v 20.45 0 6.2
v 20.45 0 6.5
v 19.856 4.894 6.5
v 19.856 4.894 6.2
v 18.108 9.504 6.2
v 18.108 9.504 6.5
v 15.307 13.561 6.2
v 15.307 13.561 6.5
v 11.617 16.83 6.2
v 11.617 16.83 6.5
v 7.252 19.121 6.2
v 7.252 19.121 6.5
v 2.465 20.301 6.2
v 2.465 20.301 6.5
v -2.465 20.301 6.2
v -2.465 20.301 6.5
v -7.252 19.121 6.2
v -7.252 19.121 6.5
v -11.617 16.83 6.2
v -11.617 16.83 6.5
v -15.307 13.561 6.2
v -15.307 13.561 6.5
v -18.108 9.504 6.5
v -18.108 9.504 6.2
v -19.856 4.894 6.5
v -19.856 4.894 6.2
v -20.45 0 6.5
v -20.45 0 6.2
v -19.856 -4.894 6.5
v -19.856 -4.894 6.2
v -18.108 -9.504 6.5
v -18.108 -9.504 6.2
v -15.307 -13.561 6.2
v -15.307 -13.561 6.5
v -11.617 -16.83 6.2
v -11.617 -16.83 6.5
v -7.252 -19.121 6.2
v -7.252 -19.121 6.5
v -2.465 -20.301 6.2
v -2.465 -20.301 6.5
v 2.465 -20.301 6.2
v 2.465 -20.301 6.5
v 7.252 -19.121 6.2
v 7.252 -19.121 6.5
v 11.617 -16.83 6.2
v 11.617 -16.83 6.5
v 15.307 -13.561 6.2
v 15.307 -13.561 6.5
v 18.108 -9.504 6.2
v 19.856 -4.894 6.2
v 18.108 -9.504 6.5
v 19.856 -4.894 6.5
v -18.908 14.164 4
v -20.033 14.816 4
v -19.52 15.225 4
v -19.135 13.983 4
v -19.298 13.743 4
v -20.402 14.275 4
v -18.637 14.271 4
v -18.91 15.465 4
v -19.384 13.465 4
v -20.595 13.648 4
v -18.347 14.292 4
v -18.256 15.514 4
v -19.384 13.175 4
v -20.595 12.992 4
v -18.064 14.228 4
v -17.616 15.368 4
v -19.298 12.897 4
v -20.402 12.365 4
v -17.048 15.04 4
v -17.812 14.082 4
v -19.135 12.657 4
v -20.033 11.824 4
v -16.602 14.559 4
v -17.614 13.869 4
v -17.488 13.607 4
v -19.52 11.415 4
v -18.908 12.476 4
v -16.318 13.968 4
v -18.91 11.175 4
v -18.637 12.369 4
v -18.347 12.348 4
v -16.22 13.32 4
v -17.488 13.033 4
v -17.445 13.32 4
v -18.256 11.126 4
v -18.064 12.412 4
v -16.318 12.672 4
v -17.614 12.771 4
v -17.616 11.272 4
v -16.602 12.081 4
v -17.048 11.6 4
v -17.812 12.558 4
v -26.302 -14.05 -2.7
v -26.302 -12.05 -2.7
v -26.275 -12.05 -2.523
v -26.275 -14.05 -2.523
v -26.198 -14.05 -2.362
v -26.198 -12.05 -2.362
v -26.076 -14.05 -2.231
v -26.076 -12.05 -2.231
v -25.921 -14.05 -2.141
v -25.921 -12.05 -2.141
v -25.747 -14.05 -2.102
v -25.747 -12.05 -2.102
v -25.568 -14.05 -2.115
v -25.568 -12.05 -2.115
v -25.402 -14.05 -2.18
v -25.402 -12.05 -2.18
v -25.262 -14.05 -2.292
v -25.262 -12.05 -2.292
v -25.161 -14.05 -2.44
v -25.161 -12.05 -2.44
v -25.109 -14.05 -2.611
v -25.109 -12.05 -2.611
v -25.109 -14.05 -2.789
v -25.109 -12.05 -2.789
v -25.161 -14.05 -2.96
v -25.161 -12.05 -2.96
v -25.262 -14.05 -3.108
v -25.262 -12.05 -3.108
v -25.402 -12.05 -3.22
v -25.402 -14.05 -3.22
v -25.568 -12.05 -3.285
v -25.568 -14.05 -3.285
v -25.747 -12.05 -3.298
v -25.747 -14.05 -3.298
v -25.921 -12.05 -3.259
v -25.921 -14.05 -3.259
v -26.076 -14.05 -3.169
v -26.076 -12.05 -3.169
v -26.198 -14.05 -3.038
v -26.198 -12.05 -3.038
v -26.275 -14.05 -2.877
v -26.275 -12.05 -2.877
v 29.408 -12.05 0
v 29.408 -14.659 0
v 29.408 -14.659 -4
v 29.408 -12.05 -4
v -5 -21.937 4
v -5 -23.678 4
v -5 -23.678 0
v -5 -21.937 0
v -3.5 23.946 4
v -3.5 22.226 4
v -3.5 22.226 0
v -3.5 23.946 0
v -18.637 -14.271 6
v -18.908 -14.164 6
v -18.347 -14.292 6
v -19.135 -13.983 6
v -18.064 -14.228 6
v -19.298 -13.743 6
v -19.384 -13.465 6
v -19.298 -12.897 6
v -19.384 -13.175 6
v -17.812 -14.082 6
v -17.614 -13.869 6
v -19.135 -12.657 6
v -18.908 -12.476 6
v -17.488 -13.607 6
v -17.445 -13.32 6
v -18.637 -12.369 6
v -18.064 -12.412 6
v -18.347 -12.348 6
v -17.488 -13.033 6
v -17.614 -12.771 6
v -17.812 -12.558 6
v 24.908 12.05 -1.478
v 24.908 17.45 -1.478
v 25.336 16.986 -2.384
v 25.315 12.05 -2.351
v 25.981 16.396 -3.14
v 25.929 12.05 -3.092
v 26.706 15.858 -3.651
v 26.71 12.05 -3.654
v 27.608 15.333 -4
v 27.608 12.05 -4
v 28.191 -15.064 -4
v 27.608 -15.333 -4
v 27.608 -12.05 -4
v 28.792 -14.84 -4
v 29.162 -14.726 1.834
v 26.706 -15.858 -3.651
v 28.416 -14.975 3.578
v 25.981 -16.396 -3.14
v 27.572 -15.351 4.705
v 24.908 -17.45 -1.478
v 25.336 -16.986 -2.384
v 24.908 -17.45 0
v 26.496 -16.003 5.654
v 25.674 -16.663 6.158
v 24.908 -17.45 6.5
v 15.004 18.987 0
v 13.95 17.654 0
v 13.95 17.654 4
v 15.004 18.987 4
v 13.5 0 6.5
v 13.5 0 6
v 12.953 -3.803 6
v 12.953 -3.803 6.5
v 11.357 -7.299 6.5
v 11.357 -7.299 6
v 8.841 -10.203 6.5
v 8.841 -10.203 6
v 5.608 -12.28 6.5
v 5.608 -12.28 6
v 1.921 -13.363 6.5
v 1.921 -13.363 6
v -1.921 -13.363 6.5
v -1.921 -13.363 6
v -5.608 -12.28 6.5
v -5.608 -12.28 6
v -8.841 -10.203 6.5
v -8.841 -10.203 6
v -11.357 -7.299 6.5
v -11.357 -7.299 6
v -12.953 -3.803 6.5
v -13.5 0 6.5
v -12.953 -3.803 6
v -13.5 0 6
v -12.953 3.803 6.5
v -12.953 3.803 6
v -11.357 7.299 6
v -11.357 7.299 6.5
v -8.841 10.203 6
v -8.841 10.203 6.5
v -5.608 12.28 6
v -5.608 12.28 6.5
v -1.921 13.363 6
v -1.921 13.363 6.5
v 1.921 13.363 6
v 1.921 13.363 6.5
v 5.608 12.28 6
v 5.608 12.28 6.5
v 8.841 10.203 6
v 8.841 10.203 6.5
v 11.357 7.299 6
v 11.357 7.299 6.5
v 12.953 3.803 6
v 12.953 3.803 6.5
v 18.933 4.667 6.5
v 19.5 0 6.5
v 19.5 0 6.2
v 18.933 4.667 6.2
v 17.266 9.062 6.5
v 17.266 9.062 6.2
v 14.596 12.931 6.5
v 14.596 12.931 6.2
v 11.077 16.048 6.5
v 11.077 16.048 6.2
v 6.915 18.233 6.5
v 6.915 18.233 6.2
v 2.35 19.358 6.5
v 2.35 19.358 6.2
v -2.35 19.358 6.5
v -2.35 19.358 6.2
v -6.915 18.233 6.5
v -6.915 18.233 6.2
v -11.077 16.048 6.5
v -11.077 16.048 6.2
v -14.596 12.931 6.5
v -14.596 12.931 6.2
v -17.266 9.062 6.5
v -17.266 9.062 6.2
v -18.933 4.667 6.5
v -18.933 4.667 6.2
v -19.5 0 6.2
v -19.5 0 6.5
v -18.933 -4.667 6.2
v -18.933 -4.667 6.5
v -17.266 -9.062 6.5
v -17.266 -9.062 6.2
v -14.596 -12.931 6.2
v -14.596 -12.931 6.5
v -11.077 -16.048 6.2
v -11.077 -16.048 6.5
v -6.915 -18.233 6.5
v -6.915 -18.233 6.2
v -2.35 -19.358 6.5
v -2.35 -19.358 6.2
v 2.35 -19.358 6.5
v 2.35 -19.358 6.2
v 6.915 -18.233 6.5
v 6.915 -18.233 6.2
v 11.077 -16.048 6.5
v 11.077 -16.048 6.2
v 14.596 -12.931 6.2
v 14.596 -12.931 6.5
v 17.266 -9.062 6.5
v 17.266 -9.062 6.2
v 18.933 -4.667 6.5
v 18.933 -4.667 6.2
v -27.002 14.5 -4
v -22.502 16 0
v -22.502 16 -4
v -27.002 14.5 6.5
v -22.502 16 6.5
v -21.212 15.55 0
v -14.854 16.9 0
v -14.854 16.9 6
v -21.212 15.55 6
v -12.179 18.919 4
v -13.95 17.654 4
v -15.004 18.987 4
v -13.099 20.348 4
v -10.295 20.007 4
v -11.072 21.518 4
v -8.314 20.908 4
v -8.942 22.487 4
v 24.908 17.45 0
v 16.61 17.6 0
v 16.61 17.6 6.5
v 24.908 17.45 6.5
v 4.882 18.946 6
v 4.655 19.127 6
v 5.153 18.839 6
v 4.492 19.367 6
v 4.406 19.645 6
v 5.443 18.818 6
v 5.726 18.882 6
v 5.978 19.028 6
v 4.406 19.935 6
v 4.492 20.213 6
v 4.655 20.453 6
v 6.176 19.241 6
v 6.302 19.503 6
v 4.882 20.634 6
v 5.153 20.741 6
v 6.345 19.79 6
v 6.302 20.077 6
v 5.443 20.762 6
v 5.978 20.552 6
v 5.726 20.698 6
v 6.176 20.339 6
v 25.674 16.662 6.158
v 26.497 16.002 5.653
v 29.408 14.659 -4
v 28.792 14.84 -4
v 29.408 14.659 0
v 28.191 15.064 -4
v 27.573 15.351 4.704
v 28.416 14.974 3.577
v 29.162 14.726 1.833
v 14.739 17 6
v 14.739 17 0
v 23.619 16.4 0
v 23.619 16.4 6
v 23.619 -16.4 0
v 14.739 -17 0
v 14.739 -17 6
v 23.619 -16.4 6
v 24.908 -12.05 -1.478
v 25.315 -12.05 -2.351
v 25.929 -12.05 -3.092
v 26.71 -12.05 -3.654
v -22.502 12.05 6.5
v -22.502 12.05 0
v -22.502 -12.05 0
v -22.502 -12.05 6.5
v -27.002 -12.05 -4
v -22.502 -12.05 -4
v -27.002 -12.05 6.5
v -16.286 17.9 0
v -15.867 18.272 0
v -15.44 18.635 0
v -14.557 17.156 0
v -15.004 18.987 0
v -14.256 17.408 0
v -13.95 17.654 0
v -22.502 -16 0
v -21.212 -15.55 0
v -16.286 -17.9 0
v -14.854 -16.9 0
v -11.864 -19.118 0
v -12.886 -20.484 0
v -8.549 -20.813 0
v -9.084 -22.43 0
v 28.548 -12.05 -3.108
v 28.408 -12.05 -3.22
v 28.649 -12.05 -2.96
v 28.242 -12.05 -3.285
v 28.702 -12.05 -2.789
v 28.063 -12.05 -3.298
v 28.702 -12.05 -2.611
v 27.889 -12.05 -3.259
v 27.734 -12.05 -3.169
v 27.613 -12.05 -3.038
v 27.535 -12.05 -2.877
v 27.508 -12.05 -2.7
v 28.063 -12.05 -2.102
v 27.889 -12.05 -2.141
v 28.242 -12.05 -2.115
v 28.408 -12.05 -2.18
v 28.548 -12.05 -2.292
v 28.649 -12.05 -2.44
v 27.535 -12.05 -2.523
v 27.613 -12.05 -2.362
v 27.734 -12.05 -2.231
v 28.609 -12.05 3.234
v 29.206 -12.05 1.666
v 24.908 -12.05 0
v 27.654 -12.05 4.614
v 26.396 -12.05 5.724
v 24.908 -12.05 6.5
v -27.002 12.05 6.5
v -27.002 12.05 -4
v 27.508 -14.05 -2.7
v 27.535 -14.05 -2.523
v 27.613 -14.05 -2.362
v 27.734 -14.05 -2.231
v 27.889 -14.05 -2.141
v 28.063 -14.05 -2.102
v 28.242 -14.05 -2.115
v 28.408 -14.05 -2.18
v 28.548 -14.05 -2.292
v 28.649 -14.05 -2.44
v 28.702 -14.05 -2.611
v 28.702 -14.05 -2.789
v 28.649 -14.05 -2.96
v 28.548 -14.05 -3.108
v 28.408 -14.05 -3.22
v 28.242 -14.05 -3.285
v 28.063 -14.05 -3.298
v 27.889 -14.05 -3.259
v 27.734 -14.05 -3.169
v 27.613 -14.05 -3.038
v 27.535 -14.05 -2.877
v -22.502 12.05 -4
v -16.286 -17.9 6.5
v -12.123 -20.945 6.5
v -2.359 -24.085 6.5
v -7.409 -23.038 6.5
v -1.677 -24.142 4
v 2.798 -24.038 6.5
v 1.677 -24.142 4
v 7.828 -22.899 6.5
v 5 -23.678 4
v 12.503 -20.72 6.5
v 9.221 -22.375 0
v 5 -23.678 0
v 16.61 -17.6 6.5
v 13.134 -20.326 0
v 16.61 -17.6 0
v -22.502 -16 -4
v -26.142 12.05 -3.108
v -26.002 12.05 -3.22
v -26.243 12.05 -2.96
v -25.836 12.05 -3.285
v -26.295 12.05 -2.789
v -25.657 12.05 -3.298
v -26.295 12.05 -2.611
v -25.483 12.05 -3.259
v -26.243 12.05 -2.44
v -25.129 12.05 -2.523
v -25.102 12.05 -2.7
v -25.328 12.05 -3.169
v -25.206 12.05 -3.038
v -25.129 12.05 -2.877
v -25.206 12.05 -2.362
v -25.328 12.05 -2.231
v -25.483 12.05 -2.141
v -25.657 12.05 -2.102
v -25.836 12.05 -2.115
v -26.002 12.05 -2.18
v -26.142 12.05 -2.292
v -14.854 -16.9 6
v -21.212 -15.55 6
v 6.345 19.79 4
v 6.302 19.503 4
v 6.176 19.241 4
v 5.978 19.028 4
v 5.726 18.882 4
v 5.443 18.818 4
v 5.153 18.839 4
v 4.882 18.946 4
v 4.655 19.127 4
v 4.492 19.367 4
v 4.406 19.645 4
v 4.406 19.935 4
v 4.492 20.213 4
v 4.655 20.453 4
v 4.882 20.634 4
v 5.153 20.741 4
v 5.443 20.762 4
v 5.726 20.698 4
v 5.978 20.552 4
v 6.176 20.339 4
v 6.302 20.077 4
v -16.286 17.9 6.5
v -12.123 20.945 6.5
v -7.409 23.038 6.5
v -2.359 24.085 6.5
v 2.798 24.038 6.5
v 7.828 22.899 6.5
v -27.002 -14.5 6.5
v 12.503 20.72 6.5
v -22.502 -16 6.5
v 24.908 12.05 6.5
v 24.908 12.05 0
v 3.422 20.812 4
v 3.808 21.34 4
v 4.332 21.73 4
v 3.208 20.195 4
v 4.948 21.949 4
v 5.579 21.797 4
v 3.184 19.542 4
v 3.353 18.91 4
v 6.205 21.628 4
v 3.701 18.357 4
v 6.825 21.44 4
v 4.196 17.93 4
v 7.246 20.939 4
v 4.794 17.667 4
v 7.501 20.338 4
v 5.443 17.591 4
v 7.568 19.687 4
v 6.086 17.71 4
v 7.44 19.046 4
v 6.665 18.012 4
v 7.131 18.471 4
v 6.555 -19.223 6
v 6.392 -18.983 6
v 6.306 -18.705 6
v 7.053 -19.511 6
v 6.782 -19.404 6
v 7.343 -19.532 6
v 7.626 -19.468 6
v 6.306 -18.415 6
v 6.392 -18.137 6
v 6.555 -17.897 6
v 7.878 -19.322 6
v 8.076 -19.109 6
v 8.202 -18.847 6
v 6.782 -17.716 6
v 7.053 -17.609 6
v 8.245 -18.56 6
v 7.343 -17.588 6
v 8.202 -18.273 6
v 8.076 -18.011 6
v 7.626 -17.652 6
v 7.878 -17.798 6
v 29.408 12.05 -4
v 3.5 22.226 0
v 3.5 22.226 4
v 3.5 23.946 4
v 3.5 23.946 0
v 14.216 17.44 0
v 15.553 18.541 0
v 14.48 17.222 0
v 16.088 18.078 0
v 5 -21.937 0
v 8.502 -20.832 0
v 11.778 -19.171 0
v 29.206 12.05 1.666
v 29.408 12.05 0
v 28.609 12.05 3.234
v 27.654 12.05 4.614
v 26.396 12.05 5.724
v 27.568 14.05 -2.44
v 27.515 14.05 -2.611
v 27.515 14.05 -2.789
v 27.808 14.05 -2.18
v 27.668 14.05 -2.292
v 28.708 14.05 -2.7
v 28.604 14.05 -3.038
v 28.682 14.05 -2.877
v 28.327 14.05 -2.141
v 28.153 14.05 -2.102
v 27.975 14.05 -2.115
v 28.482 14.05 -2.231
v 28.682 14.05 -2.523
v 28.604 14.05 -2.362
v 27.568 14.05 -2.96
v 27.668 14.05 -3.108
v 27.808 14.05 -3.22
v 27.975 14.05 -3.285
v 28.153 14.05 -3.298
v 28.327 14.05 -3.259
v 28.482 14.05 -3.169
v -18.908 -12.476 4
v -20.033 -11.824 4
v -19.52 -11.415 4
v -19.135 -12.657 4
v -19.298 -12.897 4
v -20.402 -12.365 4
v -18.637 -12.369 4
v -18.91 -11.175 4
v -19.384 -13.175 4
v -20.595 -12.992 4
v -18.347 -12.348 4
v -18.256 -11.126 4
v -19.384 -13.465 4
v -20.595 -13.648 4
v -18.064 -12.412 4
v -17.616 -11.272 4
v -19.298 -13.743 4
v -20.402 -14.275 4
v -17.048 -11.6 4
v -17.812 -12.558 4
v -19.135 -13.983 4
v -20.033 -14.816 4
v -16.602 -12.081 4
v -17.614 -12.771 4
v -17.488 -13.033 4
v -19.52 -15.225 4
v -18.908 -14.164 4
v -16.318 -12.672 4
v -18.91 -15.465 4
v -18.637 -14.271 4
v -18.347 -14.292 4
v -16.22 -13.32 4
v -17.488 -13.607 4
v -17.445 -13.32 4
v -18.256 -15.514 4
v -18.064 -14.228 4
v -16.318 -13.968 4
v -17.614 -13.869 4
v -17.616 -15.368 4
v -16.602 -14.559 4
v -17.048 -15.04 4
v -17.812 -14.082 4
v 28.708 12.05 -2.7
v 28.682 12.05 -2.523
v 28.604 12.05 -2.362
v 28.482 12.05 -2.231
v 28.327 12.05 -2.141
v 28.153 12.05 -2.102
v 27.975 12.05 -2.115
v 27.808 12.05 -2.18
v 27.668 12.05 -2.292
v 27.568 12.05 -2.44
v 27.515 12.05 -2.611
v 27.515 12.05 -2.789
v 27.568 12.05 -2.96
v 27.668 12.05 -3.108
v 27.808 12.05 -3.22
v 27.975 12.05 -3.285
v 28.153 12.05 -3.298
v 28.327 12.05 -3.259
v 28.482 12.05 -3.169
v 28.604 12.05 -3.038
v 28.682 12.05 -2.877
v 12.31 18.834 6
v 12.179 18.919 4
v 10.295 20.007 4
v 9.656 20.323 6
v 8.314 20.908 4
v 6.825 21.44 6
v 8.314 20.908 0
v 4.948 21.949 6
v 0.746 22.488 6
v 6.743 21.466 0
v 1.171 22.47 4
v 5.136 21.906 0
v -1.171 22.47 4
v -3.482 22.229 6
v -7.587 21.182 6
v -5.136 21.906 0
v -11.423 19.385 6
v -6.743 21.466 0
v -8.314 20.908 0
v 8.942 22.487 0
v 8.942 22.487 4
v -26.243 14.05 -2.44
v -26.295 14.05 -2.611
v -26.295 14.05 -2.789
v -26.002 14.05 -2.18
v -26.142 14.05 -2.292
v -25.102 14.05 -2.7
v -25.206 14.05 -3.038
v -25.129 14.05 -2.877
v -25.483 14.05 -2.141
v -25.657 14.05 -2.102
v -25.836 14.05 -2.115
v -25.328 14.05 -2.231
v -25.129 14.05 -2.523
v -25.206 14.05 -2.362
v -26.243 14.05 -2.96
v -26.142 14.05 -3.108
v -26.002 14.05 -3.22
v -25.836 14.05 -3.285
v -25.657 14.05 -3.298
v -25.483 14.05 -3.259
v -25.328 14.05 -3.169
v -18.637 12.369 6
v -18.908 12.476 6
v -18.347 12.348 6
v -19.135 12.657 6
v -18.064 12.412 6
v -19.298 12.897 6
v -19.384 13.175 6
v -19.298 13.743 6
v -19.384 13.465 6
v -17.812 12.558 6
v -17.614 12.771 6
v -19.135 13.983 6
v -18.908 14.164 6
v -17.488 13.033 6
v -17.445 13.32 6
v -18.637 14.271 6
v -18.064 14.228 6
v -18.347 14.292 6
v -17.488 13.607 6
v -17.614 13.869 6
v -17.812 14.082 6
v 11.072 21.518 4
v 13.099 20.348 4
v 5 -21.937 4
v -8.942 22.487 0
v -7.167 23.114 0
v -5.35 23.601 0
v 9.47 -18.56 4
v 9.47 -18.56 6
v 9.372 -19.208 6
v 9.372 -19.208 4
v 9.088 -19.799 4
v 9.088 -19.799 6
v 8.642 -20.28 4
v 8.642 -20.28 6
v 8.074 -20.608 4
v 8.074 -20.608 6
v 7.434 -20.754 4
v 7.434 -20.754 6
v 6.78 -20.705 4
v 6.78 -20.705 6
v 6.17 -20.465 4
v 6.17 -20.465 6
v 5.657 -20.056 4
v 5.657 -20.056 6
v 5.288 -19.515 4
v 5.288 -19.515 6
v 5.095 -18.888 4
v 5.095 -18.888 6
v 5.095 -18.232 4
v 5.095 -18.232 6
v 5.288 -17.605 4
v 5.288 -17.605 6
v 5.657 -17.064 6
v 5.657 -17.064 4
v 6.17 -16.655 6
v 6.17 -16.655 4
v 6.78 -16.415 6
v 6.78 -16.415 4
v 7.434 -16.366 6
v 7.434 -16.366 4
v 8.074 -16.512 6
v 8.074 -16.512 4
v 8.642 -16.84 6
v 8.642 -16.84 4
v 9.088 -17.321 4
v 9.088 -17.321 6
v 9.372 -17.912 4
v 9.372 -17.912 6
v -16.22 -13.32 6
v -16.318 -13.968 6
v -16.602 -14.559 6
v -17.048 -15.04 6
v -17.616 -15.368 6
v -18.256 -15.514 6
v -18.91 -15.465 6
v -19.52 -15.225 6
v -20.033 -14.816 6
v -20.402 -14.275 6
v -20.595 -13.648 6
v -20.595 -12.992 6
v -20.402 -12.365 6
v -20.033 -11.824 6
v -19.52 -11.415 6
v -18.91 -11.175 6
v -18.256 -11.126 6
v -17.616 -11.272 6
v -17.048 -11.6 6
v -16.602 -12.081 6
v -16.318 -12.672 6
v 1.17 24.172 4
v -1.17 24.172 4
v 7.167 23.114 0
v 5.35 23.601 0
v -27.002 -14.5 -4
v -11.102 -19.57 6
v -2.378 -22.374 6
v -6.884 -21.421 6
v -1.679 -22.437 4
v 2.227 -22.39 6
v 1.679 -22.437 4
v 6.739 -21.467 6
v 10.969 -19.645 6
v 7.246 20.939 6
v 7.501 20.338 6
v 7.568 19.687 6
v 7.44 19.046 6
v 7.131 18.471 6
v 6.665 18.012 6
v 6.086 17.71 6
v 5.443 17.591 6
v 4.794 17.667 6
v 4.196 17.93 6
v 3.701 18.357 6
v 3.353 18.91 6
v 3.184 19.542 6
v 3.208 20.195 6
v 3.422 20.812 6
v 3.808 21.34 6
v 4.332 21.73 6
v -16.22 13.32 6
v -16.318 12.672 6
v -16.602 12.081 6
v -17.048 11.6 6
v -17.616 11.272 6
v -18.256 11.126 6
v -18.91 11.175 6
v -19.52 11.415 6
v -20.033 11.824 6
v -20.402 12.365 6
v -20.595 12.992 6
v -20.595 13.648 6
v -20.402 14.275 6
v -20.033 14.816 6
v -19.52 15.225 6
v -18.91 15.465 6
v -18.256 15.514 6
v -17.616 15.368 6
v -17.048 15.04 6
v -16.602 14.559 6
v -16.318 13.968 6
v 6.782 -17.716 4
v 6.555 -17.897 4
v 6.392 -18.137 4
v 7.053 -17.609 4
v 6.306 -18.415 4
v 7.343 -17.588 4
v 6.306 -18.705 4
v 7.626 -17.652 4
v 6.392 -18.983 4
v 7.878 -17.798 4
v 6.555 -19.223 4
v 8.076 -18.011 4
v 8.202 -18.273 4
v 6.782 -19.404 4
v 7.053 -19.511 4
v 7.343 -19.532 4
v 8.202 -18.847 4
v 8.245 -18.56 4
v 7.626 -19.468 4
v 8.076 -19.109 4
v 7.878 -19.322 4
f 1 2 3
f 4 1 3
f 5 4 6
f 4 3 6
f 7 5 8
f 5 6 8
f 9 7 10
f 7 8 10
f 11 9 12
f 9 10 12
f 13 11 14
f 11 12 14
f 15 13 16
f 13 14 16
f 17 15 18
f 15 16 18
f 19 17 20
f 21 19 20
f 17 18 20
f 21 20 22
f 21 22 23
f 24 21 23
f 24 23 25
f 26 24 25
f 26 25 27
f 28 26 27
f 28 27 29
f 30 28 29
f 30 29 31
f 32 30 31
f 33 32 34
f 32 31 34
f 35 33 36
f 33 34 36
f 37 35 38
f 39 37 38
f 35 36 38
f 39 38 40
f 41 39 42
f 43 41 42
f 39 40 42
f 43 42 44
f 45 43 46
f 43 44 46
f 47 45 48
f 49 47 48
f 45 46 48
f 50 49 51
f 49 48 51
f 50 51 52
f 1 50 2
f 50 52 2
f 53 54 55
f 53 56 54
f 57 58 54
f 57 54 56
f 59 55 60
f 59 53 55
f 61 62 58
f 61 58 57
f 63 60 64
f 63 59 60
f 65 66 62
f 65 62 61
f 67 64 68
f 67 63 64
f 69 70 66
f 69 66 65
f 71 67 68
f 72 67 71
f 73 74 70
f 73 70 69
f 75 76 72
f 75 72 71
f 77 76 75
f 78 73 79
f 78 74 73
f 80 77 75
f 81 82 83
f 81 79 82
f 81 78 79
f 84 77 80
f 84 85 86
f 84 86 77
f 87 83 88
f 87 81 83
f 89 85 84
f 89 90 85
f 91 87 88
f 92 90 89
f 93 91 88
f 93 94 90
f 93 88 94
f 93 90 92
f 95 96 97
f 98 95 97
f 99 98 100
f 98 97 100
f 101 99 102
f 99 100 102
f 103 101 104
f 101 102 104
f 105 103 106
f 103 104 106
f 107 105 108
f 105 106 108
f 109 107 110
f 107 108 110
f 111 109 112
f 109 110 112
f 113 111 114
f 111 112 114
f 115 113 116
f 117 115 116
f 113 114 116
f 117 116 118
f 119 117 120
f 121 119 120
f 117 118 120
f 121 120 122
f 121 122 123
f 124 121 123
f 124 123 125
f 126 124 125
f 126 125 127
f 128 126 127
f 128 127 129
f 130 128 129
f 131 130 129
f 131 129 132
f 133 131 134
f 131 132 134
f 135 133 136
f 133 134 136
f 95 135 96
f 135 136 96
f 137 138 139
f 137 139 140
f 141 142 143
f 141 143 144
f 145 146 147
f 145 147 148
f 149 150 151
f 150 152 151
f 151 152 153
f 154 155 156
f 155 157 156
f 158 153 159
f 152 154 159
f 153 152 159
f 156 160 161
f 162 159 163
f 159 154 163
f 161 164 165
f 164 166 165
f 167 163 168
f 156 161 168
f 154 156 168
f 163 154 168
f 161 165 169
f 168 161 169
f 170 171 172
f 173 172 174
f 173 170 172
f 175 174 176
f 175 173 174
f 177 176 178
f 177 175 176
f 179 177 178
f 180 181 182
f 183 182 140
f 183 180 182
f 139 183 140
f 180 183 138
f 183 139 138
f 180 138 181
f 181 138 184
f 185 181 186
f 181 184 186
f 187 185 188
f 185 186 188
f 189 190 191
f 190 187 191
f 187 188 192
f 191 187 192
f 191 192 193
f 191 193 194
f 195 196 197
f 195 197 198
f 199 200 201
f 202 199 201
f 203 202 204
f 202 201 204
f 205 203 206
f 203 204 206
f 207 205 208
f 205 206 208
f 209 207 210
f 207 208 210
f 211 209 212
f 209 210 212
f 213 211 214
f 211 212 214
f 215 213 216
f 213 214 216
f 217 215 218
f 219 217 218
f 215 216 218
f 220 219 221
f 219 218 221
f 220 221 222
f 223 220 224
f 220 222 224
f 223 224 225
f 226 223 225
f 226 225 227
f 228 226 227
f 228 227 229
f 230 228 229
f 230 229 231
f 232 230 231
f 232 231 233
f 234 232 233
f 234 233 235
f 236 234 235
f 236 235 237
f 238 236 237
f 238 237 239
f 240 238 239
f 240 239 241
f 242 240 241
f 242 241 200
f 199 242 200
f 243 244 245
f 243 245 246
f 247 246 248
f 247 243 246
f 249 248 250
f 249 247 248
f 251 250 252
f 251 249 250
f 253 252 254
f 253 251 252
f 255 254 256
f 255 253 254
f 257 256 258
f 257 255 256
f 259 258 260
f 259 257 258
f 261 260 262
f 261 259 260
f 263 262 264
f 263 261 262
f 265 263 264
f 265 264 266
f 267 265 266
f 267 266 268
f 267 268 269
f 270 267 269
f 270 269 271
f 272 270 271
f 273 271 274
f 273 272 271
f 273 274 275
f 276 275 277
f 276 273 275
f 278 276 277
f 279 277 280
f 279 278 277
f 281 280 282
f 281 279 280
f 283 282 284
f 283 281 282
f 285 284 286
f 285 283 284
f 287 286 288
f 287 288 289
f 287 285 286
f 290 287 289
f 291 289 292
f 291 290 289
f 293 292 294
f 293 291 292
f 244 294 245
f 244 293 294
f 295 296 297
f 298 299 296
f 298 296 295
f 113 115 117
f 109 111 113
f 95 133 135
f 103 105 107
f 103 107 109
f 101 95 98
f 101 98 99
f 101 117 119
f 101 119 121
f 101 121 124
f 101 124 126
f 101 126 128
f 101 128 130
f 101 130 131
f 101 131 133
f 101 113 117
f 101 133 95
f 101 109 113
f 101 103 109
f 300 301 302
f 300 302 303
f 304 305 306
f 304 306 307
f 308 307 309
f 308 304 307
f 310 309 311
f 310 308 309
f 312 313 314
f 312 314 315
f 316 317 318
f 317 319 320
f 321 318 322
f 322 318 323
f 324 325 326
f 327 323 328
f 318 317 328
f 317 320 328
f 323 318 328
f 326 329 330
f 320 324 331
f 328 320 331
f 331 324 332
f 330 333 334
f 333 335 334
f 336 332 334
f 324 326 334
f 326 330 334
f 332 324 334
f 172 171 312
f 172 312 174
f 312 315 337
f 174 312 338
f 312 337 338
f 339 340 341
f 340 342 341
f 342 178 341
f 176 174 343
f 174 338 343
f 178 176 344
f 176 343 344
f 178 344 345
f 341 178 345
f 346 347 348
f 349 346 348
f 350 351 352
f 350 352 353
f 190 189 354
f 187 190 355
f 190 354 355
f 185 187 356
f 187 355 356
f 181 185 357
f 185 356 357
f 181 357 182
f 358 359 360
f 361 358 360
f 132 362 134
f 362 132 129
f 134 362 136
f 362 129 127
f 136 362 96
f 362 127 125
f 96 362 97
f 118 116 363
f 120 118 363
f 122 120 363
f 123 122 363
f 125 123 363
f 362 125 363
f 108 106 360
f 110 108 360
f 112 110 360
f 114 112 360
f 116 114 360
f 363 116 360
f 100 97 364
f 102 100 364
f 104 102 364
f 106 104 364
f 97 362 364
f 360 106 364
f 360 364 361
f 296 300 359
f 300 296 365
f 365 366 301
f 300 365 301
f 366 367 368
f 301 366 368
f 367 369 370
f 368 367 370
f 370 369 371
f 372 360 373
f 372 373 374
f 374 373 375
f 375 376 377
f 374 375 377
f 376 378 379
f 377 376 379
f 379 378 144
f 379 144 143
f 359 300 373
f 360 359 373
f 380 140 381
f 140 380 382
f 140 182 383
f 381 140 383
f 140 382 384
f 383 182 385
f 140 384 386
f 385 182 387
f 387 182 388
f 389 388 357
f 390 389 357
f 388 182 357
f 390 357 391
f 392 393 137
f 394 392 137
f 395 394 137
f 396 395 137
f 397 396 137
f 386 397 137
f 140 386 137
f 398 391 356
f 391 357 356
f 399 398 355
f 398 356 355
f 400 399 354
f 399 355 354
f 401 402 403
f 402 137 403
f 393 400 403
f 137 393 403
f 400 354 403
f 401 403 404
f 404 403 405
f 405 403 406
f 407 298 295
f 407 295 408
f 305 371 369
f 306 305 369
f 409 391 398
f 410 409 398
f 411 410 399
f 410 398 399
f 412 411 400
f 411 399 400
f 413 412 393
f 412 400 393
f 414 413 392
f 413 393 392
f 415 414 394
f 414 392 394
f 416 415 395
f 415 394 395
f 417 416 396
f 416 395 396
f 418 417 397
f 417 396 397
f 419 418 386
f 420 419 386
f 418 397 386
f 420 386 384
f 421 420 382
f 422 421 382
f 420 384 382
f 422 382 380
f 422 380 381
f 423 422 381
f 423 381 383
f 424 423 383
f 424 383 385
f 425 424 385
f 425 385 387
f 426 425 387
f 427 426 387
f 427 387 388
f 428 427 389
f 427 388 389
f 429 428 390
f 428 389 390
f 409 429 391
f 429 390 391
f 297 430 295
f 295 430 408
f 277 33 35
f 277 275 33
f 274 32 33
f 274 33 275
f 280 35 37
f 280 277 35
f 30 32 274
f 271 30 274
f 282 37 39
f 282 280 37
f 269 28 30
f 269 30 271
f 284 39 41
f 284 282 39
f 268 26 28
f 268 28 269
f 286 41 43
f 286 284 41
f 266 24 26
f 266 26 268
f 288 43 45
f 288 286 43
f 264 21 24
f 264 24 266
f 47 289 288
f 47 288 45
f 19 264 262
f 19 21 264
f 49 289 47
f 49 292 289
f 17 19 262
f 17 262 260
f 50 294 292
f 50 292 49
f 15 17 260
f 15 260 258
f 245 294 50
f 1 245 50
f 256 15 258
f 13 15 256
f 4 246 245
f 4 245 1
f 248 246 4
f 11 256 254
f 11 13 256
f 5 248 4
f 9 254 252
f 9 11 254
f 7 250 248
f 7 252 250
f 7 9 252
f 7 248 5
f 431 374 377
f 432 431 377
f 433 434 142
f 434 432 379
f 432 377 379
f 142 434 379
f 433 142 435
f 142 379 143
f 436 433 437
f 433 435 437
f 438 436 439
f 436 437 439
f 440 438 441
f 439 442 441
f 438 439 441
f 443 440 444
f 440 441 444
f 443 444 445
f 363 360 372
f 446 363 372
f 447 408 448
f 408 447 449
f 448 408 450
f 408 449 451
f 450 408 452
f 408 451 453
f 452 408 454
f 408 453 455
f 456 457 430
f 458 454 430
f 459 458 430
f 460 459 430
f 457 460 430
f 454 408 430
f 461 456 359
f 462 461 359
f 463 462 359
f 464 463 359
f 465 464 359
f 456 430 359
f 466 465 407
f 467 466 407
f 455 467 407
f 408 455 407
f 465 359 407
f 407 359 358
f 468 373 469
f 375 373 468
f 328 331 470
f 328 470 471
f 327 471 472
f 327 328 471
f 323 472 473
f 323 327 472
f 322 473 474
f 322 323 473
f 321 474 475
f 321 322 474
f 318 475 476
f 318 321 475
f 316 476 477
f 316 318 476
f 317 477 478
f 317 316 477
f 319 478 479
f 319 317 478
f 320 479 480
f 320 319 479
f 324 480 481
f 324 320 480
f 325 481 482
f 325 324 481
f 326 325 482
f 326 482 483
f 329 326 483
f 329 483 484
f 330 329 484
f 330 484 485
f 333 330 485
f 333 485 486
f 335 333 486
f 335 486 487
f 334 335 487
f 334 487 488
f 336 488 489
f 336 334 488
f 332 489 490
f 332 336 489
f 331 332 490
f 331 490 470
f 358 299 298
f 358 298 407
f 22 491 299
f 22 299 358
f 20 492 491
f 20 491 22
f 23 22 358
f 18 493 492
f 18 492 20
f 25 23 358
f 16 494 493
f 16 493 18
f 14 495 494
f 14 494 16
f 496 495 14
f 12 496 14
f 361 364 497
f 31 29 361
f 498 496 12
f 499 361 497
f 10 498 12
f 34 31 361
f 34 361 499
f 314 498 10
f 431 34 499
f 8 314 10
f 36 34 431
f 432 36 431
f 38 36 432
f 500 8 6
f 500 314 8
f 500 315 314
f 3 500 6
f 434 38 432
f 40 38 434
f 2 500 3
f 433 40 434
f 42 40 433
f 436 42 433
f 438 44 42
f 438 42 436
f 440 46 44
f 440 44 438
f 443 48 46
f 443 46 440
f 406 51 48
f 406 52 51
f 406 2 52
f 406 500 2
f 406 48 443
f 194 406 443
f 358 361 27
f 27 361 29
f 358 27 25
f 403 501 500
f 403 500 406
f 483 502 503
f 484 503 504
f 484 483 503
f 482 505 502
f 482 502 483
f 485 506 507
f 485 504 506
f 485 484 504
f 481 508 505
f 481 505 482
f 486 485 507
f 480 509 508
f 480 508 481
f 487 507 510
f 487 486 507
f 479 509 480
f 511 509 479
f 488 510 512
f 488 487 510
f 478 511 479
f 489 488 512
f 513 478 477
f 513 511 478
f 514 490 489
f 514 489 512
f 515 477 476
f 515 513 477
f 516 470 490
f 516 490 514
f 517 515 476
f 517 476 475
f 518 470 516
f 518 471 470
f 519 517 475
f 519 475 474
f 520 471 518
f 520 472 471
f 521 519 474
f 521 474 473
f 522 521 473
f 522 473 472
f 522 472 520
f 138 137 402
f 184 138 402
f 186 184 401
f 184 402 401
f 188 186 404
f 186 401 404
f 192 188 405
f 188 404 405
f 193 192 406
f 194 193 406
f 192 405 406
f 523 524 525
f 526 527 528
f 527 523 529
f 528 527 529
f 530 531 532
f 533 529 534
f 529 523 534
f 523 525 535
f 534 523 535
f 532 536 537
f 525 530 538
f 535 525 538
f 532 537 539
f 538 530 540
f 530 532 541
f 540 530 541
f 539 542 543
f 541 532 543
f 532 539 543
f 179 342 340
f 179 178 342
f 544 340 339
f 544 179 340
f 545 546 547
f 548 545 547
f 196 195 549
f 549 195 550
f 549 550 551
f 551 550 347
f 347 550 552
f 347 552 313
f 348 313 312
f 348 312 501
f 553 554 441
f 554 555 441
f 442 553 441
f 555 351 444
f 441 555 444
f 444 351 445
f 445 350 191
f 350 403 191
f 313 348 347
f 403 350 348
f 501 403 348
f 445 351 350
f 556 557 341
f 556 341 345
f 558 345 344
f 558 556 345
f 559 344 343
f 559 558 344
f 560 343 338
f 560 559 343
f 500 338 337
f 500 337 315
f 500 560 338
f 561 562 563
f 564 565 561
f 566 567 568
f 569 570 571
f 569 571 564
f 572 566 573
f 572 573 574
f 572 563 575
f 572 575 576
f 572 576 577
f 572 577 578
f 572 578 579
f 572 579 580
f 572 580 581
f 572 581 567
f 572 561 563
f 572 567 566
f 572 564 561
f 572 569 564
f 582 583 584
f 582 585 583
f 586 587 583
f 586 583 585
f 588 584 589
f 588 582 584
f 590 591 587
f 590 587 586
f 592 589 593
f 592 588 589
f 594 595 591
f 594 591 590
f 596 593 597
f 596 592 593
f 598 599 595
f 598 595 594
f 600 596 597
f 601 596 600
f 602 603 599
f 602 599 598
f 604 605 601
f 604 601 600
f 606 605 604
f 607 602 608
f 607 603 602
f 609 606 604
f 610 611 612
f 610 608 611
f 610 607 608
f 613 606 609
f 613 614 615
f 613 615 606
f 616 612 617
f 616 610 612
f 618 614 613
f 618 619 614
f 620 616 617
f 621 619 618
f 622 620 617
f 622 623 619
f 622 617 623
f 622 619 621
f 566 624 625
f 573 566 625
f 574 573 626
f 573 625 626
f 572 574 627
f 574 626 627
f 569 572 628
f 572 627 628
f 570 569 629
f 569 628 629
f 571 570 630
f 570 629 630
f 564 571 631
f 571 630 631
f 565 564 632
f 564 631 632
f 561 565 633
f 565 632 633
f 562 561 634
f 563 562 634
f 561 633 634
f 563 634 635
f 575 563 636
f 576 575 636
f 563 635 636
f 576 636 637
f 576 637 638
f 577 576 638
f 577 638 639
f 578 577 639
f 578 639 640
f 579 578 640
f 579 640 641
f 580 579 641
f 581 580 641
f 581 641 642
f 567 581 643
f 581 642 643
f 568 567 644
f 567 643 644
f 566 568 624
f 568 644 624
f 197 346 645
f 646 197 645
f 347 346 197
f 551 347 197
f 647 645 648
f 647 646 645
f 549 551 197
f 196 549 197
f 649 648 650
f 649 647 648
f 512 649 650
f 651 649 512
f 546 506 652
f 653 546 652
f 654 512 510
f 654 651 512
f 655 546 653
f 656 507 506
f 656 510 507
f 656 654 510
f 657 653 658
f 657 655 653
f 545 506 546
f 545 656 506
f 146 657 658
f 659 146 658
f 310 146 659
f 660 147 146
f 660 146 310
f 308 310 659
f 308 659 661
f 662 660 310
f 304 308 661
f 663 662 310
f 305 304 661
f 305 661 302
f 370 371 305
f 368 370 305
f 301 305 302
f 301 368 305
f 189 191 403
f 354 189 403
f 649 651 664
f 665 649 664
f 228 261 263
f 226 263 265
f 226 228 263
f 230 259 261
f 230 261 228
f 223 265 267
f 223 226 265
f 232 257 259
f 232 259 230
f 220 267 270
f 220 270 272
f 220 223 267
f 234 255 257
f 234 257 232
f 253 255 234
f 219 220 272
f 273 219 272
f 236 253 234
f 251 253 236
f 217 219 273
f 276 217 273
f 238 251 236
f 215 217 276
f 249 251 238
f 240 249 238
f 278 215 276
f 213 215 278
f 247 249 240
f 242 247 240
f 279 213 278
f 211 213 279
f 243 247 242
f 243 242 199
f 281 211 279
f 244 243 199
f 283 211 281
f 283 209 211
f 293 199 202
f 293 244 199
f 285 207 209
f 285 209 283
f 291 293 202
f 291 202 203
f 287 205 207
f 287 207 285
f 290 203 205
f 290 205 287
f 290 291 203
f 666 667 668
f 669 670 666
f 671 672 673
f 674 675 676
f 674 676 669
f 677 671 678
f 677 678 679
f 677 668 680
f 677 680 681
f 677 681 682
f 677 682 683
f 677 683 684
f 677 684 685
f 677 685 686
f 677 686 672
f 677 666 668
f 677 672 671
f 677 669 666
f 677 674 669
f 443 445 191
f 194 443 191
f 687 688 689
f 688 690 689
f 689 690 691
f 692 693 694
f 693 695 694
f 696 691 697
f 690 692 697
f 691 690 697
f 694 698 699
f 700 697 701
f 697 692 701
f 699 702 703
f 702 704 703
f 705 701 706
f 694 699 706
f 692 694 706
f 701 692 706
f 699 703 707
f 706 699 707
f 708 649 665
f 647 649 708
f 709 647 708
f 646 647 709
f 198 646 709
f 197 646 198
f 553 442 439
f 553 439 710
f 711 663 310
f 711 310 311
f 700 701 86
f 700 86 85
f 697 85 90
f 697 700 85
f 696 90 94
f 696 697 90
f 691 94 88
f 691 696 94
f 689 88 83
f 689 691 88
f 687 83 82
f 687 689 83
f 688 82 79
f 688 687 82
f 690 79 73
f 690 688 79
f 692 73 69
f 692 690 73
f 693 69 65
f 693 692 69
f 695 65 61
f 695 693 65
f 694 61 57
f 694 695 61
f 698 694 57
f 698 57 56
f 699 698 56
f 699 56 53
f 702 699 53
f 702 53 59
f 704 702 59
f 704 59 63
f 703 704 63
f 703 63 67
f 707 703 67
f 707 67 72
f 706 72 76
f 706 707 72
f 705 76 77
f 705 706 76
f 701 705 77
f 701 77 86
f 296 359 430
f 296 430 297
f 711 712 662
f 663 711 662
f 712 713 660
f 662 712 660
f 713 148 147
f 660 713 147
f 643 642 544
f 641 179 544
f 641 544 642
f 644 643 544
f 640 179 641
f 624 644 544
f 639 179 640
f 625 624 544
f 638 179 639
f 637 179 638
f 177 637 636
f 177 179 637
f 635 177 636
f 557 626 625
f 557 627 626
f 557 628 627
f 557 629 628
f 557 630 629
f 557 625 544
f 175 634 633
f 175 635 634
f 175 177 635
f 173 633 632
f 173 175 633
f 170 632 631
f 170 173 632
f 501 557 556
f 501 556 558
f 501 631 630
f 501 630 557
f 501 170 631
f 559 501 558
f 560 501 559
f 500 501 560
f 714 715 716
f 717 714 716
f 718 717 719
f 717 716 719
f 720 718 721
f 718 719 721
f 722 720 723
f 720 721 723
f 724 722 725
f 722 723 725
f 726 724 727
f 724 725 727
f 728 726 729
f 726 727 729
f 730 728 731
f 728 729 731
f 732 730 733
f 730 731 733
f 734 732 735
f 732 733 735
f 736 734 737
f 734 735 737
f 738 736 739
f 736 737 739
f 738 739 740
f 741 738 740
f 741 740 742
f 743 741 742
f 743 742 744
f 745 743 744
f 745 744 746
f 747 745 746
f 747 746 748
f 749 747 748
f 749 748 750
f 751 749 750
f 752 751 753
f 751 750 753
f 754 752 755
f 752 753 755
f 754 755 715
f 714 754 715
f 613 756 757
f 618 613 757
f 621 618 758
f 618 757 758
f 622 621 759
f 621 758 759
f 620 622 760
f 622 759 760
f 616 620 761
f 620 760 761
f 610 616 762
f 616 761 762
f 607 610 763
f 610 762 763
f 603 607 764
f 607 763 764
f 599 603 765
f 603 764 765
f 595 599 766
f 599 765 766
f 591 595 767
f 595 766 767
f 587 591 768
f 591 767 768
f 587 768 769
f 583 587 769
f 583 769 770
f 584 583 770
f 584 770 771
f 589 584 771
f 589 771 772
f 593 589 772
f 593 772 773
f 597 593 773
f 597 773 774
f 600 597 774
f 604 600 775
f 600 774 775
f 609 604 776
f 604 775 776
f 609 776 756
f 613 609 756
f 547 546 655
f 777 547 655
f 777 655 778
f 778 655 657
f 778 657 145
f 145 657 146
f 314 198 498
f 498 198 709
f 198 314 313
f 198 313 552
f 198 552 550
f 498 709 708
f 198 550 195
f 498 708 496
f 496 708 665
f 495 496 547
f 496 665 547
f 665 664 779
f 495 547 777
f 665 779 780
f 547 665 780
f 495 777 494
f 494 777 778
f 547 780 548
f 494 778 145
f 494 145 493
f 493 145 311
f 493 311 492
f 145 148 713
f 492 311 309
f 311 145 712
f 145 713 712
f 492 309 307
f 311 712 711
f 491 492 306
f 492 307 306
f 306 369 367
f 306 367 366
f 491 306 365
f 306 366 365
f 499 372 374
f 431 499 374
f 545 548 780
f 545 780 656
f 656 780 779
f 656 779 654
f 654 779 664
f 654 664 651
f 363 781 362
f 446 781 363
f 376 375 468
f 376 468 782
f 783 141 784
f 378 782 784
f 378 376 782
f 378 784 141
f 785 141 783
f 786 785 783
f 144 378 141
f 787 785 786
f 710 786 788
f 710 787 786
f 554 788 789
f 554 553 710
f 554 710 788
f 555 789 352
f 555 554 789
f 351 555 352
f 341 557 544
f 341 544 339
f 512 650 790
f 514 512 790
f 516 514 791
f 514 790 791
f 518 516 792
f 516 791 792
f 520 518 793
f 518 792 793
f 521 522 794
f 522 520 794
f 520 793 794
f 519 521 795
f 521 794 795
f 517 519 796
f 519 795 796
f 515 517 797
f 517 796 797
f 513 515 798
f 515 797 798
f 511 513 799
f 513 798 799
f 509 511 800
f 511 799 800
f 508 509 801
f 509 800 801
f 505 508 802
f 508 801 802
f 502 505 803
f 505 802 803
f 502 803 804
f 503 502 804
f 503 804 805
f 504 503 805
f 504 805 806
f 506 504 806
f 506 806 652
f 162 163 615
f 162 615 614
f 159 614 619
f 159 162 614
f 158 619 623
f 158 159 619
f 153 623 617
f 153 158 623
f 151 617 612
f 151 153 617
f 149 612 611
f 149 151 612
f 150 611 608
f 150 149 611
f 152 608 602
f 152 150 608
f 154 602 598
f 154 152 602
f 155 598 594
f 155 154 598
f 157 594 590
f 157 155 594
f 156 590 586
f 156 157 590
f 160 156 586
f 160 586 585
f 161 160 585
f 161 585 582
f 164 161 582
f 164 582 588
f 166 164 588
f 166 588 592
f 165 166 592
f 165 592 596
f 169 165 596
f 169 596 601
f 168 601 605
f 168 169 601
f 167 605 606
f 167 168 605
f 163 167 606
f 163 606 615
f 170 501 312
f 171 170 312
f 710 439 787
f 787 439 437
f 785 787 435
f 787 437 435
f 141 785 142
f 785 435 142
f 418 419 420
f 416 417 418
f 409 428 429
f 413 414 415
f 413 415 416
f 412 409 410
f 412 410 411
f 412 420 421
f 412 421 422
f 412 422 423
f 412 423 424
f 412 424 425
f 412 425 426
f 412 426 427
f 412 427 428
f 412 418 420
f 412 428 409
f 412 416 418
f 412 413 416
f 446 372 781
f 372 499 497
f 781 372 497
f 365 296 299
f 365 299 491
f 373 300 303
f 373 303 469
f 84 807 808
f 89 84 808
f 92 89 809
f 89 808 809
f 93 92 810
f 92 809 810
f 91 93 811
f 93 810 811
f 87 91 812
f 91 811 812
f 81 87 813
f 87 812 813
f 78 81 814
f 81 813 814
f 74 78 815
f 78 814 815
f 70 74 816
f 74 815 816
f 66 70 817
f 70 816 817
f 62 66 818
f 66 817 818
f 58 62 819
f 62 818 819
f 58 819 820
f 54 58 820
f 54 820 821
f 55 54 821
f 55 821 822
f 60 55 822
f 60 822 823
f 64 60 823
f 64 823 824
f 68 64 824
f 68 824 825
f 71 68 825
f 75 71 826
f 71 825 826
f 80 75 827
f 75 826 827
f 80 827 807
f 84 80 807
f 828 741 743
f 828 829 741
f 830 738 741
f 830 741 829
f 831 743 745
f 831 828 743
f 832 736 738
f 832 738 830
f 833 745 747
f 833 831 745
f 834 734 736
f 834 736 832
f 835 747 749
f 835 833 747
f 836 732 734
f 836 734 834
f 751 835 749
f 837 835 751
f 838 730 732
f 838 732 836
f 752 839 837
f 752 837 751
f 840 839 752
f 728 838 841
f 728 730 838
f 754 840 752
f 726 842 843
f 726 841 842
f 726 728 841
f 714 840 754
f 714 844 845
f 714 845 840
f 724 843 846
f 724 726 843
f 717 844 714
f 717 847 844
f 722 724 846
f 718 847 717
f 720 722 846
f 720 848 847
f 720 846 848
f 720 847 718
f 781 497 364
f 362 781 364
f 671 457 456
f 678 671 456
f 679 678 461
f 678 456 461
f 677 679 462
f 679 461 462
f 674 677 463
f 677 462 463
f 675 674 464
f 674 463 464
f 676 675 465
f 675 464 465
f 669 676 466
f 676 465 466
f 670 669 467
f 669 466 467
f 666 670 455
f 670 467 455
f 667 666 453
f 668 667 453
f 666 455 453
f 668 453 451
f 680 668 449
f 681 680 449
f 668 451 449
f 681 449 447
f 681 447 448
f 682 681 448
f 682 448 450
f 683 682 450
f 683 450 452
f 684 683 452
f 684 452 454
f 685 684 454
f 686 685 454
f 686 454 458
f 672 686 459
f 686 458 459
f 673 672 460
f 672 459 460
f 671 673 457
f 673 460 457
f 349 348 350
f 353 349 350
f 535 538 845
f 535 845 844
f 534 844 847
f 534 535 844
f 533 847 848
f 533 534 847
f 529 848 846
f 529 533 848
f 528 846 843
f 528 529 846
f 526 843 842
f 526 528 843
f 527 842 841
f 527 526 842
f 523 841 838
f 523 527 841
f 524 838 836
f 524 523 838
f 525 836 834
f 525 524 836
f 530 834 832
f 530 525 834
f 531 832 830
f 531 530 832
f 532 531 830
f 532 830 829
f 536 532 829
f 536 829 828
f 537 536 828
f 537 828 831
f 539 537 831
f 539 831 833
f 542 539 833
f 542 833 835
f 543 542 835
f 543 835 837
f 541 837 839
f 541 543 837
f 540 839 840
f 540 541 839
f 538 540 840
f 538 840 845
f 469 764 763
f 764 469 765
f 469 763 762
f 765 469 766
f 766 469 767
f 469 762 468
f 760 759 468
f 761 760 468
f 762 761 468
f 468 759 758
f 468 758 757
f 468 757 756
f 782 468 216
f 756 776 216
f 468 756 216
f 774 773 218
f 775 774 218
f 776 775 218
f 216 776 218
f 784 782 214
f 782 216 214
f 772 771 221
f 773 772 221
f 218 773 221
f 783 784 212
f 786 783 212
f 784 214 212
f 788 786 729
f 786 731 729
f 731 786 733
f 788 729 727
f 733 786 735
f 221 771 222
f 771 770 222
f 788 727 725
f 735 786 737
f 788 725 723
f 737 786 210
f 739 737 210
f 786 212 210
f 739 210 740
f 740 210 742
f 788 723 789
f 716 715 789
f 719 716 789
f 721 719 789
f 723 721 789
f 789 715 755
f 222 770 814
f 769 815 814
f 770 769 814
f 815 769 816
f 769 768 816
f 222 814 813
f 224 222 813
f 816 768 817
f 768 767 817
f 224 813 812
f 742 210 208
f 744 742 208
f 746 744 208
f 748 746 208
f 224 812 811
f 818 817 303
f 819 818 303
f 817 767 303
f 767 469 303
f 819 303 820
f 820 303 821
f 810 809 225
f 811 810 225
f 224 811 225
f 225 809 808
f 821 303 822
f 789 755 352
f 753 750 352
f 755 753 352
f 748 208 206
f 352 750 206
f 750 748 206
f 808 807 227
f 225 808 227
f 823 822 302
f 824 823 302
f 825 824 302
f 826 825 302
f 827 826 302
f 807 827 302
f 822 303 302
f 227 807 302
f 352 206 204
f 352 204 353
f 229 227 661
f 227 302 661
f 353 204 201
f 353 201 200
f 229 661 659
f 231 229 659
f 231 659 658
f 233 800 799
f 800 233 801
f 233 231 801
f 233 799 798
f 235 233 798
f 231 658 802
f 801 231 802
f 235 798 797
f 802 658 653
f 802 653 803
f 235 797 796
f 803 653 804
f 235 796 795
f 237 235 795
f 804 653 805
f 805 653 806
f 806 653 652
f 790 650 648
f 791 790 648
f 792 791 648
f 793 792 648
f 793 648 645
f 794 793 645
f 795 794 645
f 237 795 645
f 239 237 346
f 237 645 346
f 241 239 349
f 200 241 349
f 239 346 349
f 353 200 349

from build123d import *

# Parameters (mm, degrees)
PAD_DEPTH            = 6.5
POCKET_DEPTH         = 6
SKETCH002_R          = 13.5
POCKET001_DEPTH      = 1
SKETCH003_W          = 5.4
SKETCH003_H          = 6.5
PAD001_DEPTH         = 4.5
POCKET002_DEPTH      = 10
SKETCH010_W          = 3.95
SKETCH010_H          = 6.5
PAD002_DEPTH         = 4.5
POCKET005_DEPTH      = 10
SKETCH014_R          = 20.45
SKETCH014_R_2        = 19.5
POCKET008_DEPTH      = 0.3
SKETCH015_R          = 2.2
SKETCH015_R_2        = 0.975
PAD003_DEPTH         = 2
POCKET009_DEPTH      = 4
POCKET010_DEPTH      = 4
PAD004_DEPTH         = 4
SKETCH019_R          = 0.6
POCKET011_DEPTH      = 2
SKETCH020_R          = 0.6
POCKET012_DEPTH      = 2
POCKET013_DEPTH      = 12.151
POCKET013_DEPTH_BACK = 36.251


with BuildPart() as part:
    # Sketch → Pad (new body)
    with BuildSketch(Plane.XY):
        with BuildLine():
            Line((-22.5019915649, 16), (-22.5019915649, -16))
            Line((-22.5019915649, -16), (-16.2858834577, -17.9000000001))
            ThreePointArc((-16.2858834577, -17.9000000001), (0.2206895737, -24.1989937004), (16.6096357576, -17.5999999999))
            Line((16.6096357576, -17.5999999999), (24.9082802252, -17.45))
            Line((24.9082802252, 17.45), (24.9082802252, -17.45))
            Line((16.6096357576, 17.6), (24.9082802252, 17.45))
            ThreePointArc((16.6096357576, 17.6), (0.2206895736, 24.1989937004), (-16.2858834578, 17.9))
            Line((-22.5019915649, 16), (-16.2858834578, 17.9))
        make_face()
    extrude(amount=PAD_DEPTH)

    # Sketch001 → Pocket (cut)
    with BuildSketch(Plane.XY):
        with BuildLine():
            Line((-14.8539557021, 16.9), (-21.2122180433, 15.55))
            Line((-21.2122180433, 15.55), (-21.2122180433, -15.55))
            Line((-21.2122180433, -15.55), (-14.8539557021, -16.9))
            ThreePointArc((-14.8539557021, -16.9), (-0.0760301383, -22.4998715423), (14.739402973, -17))
            Line((14.739402973, -17), (23.6191552218, -16.4))
            Line((23.6191552218, 16.4), (23.6191552218, -16.4))
            Line((14.739402973, 17), (23.6191552218, 16.4))
            ThreePointArc((14.739402973, 17), (-0.0760301383, 22.4998715423), (-14.8539557021, 16.9))
        make_face()
    extrude(amount=POCKET_DEPTH, mode=Mode.SUBTRACT)

    # Sketch002 (on Face19 of Pocket) → Pocket001 (cut)
    with BuildSketch(Plane(origin=(0, 0, 6), x_dir=(1, 0, 0), z_dir=(0, 0, -1))):
        Circle(SKETCH002_R)
    extrude(amount=-POCKET001_DEPTH, mode=Mode.SUBTRACT)

    # Sketch003 (on Face7 of Pad) → Pad001 (join)
    with BuildSketch(Plane.YZ.offset(24.9082802252)):
        with Locations((-14.75, 3.25)):
            Rectangle(SKETCH003_W, SKETCH003_H)
        with Locations((14.75, 3.25)):
            Rectangle(SKETCH003_W, SKETCH003_H)
    extrude(amount=PAD001_DEPTH)

    # Sketch006 (on Face22 of Pad001) → Pocket002 (cut)
    with BuildSketch(Plane.XY.offset(6.5)):
        with BuildLine():
            ThreePointArc((24.9082802252, 17.45), (26.9423471239, 15.7065020586), (29.4082802252, 14.6594169811))
            Line((29.4082802252, 17.45), (29.4082802252, 14.6594169811))
            Line((29.4082802252, 17.45), (24.9082802252, 17.45))
        make_face()
        with BuildLine():
            ThreePointArc((29.4082802252, -14.6594169811), (26.9423471239, -15.7065020586), (24.9082802252, -17.45))
            Line((29.4082802252, -17.45), (24.9082802252, -17.45))
            Line((29.4082802252, -14.6594169811), (29.4082802252, -17.45))
        make_face()
    extrude(amount=-POCKET002_DEPTH, mode=Mode.SUBTRACT)

    # Sketch010 (on Face3 of Pad) → Pad002 (join)
    with BuildSketch(Plane(origin=(-22.5019915649, 0, 0), x_dir=(0, -1, 0), z_dir=(-1, 0, 0))):
        with Locations((-14.025, 3.25)):
            Rectangle(SKETCH010_W, SKETCH010_H)
        with Locations((14.025, 3.25)):
            Rectangle(SKETCH010_W, SKETCH010_H)
    extrude(amount=PAD002_DEPTH)

    # Sketch011 (on Face28 of Pad002) → Pocket005 (cut)
    with BuildSketch(Plane.XY.offset(6.5)):
        Polygon((-27.0019915649, 16), (-22.5019915649, 16), (-27.0019915649, 14.5), align=None)
        Polygon((-22.5019915649, -16), (-27.0019915649, -14.5), (-27.0019915649, -16), align=None)
    extrude(amount=-POCKET005_DEPTH, mode=Mode.SUBTRACT)

    # Sketch014 (on Face10 of Pad) → Pocket008 (cut)
    with BuildSketch(Plane.XY.offset(6.5)):
        Circle(SKETCH014_R)
        Circle(SKETCH014_R_2, mode=Mode.SUBTRACT)
    extrude(amount=-POCKET008_DEPTH, mode=Mode.SUBTRACT)

    # Sketch015 (on Face19 of Pocket) → Pad003 (join)
    with BuildSketch(Plane(origin=(0, 0, 6), x_dir=(1, 0, 0), z_dir=(0, 0, -1))):
        with Locations((-18.42, 13.32)):
            Circle(SKETCH015_R)
        with Locations((-18.42, 13.32)):
            Circle(SKETCH015_R_2, mode=Mode.SUBTRACT)
        with Locations((7.27, 18.56)):
            Circle(SKETCH015_R)
        with Locations((7.27, 18.56)):
            Circle(SKETCH015_R_2, mode=Mode.SUBTRACT)
        with Locations((5.37, -19.79)):
            Circle(SKETCH015_R)
        with Locations((5.37, -19.79)):
            Circle(SKETCH015_R_2, mode=Mode.SUBTRACT)
        with Locations((-18.42, -13.32)):
            Circle(SKETCH015_R)
        with Locations((-18.42, -13.32)):
            Circle(SKETCH015_R_2, mode=Mode.SUBTRACT)
    extrude(amount=PAD003_DEPTH)

    # Sketch016 → Pocket009 (cut)
    with BuildSketch(Plane(origin=(0, 0, 0), x_dir=(-1, 0, 0), z_dir=(0, 0, 1))):
        with BuildLine():
            Line((-5, 23.6778377391), (-5, 21.9374109685))
            ThreePointArc((5, 21.9374109685), (0, 22.5), (-5, 21.9374109685))
            Line((5, 23.6778377391), (5, 21.9374109685))
            ThreePointArc((5, 23.6778377391), (0, 24.2), (-5, 23.6778377391))
        make_face()
    extrude(amount=POCKET009_DEPTH, mode=Mode.SUBTRACT)

    # Sketch017 → Pocket010 (cut)
    with BuildSketch(Plane(origin=(0, 0, 0), x_dir=(-1, 0, 0), z_dir=(0, 0, 1))):
        with BuildLine():
            Line((-3.499984119, -22.2261132717), (-3.5, -23.9455632634))
            ThreePointArc((-3.5, -23.9455632634), (0, -24.2000019575), (3.5, -23.9455632634))
            Line((3.5000158811, -22.2261082701), (3.5, -23.9455632634))
            ThreePointArc((-3.499984119, -22.2261132717), (1.60767e-05, -22.5), (3.5000158811, -22.2261082701))
        make_face()
        with BuildLine():
            ThreePointArc((-13.9498796389, -17.6536358312), (-11.25, -19.4855715851), (-8.3135572795, -20.9077680626))
            Line((-8.3135572795, -20.9077680626), (-8.9416927184, -22.487466094))
            ThreePointArc((-15.0038705449, -18.987466094), (-12.1, -20.9578147716), (-8.9416927184, -22.487466094))
            Line((-13.9498796389, -17.6536358312), (-15.0038705449, -18.987466094))
        make_face()
        with BuildLine():
            ThreePointArc((8.3135572795, -20.9077680626), (11.25, -19.4855715851), (13.9498796389, -17.6536358312))
            Line((13.9498796389, -17.6536358312), (15.0038705449, -18.987466094))
            ThreePointArc((8.9416927184, -22.487466094), (12.1, -20.9578147716), (15.0038705449, -18.987466094))
            Line((8.3135572795, -20.9077680626), (8.9416927184, -22.487466094))
        make_face()
    extrude(amount=POCKET010_DEPTH, mode=Mode.SUBTRACT)

    # Sketch018 (on Face8 of Pocket005) → Pad004 (join)
    with BuildSketch(Plane(origin=(0, 0, 0), x_dir=(1, 0, 0), z_dir=(0, 0, -1))):
        Polygon((-27.0019915649, 14.5), (-27.0019915649, 12.05), (-22.5019915649, 12.05), (-22.5019915649, 16), align=None)
        Polygon((-27.0019915649, -12.05), (-22.5019915649, -12.05), (-22.5019915649, -16), (-27.0019915649, -14.5), align=None)
        with BuildLine():
            Line((24.9082802252, 17.45), (24.9082802252, 12.05))
            Line((29.4082802252, 12.05), (24.9082802252, 12.05))
            Line((29.4082802252, 14.6594169811), (29.4082802252, 12.05))
            ThreePointArc((24.9082802252, 17.45), (26.9423471239, 15.7065020586), (29.4082802252, 14.6594169811))
        make_face()
        with BuildLine():
            Line((24.9082802252, -12.05), (24.9082802252, -17.45))
            ThreePointArc((29.4082802252, -14.6594169811), (26.9423471239, -15.7065020586), (24.9082802252, -17.45))
            Line((29.4082802252, -12.05), (29.4082802252, -14.6594169811))
            Line((24.9082802252, -12.05), (29.4082802252, -12.05))
        make_face()
    extrude(amount=PAD004_DEPTH)

    # Sketch019 (on Face64 of Pad004) → Pocket011 (cut)
    with BuildSketch(Plane.XZ.offset(-12.05)):
        with Locations((28.1082802252, -2.7)):
            Circle(SKETCH019_R)
        with Locations((-25.7019915649, -2.7)):
            Circle(SKETCH019_R)
    extrude(amount=-POCKET011_DEPTH, mode=Mode.SUBTRACT)

    # Sketch020 (on Face50 of Pocket011) → Pocket012 (cut)
    with BuildSketch(Plane(origin=(0, -12.05, 0), x_dir=(-1, 0, 0), z_dir=(0, 1, 0))):
        with Locations((-28.1082802252, -2.7)):
            Circle(SKETCH020_R)
        with Locations((25.7019915649, -2.7)):
            Circle(SKETCH020_R)
    extrude(amount=-POCKET012_DEPTH, mode=Mode.SUBTRACT)

    # Sketch021 (on Face48 of Pocket012) → Pocket013 (cut, two sides)
    with BuildSketch(Plane.XZ.offset(-12.05)) as pocket013_sk:
        with BuildLine():
            ThreePointArc((29.4082802252, 0), (28.1735037783, 3.9528470752), (24.9082802252, 6.5))
            Line((24.9082802252, 6.5), (29.4082802252, 6.5))
            Line((29.4082802252, 6.5), (29.4082802252, 0))
        make_face()
        with BuildLine():
            ThreePointArc((24.9082802252, -1.478433716), (25.9291187082, -3.0916708473), (27.6082802252, -4))
            Line((24.9082802252, -4), (27.6082802252, -4))
            Line((24.9082802252, -1.478433716), (24.9082802252, -4))
        make_face()
    extrude(amount=-POCKET013_DEPTH, mode=Mode.SUBTRACT)
    extrude(pocket013_sk.sketch, amount=POCKET013_DEPTH_BACK, mode=Mode.SUBTRACT)


solid = part.part
